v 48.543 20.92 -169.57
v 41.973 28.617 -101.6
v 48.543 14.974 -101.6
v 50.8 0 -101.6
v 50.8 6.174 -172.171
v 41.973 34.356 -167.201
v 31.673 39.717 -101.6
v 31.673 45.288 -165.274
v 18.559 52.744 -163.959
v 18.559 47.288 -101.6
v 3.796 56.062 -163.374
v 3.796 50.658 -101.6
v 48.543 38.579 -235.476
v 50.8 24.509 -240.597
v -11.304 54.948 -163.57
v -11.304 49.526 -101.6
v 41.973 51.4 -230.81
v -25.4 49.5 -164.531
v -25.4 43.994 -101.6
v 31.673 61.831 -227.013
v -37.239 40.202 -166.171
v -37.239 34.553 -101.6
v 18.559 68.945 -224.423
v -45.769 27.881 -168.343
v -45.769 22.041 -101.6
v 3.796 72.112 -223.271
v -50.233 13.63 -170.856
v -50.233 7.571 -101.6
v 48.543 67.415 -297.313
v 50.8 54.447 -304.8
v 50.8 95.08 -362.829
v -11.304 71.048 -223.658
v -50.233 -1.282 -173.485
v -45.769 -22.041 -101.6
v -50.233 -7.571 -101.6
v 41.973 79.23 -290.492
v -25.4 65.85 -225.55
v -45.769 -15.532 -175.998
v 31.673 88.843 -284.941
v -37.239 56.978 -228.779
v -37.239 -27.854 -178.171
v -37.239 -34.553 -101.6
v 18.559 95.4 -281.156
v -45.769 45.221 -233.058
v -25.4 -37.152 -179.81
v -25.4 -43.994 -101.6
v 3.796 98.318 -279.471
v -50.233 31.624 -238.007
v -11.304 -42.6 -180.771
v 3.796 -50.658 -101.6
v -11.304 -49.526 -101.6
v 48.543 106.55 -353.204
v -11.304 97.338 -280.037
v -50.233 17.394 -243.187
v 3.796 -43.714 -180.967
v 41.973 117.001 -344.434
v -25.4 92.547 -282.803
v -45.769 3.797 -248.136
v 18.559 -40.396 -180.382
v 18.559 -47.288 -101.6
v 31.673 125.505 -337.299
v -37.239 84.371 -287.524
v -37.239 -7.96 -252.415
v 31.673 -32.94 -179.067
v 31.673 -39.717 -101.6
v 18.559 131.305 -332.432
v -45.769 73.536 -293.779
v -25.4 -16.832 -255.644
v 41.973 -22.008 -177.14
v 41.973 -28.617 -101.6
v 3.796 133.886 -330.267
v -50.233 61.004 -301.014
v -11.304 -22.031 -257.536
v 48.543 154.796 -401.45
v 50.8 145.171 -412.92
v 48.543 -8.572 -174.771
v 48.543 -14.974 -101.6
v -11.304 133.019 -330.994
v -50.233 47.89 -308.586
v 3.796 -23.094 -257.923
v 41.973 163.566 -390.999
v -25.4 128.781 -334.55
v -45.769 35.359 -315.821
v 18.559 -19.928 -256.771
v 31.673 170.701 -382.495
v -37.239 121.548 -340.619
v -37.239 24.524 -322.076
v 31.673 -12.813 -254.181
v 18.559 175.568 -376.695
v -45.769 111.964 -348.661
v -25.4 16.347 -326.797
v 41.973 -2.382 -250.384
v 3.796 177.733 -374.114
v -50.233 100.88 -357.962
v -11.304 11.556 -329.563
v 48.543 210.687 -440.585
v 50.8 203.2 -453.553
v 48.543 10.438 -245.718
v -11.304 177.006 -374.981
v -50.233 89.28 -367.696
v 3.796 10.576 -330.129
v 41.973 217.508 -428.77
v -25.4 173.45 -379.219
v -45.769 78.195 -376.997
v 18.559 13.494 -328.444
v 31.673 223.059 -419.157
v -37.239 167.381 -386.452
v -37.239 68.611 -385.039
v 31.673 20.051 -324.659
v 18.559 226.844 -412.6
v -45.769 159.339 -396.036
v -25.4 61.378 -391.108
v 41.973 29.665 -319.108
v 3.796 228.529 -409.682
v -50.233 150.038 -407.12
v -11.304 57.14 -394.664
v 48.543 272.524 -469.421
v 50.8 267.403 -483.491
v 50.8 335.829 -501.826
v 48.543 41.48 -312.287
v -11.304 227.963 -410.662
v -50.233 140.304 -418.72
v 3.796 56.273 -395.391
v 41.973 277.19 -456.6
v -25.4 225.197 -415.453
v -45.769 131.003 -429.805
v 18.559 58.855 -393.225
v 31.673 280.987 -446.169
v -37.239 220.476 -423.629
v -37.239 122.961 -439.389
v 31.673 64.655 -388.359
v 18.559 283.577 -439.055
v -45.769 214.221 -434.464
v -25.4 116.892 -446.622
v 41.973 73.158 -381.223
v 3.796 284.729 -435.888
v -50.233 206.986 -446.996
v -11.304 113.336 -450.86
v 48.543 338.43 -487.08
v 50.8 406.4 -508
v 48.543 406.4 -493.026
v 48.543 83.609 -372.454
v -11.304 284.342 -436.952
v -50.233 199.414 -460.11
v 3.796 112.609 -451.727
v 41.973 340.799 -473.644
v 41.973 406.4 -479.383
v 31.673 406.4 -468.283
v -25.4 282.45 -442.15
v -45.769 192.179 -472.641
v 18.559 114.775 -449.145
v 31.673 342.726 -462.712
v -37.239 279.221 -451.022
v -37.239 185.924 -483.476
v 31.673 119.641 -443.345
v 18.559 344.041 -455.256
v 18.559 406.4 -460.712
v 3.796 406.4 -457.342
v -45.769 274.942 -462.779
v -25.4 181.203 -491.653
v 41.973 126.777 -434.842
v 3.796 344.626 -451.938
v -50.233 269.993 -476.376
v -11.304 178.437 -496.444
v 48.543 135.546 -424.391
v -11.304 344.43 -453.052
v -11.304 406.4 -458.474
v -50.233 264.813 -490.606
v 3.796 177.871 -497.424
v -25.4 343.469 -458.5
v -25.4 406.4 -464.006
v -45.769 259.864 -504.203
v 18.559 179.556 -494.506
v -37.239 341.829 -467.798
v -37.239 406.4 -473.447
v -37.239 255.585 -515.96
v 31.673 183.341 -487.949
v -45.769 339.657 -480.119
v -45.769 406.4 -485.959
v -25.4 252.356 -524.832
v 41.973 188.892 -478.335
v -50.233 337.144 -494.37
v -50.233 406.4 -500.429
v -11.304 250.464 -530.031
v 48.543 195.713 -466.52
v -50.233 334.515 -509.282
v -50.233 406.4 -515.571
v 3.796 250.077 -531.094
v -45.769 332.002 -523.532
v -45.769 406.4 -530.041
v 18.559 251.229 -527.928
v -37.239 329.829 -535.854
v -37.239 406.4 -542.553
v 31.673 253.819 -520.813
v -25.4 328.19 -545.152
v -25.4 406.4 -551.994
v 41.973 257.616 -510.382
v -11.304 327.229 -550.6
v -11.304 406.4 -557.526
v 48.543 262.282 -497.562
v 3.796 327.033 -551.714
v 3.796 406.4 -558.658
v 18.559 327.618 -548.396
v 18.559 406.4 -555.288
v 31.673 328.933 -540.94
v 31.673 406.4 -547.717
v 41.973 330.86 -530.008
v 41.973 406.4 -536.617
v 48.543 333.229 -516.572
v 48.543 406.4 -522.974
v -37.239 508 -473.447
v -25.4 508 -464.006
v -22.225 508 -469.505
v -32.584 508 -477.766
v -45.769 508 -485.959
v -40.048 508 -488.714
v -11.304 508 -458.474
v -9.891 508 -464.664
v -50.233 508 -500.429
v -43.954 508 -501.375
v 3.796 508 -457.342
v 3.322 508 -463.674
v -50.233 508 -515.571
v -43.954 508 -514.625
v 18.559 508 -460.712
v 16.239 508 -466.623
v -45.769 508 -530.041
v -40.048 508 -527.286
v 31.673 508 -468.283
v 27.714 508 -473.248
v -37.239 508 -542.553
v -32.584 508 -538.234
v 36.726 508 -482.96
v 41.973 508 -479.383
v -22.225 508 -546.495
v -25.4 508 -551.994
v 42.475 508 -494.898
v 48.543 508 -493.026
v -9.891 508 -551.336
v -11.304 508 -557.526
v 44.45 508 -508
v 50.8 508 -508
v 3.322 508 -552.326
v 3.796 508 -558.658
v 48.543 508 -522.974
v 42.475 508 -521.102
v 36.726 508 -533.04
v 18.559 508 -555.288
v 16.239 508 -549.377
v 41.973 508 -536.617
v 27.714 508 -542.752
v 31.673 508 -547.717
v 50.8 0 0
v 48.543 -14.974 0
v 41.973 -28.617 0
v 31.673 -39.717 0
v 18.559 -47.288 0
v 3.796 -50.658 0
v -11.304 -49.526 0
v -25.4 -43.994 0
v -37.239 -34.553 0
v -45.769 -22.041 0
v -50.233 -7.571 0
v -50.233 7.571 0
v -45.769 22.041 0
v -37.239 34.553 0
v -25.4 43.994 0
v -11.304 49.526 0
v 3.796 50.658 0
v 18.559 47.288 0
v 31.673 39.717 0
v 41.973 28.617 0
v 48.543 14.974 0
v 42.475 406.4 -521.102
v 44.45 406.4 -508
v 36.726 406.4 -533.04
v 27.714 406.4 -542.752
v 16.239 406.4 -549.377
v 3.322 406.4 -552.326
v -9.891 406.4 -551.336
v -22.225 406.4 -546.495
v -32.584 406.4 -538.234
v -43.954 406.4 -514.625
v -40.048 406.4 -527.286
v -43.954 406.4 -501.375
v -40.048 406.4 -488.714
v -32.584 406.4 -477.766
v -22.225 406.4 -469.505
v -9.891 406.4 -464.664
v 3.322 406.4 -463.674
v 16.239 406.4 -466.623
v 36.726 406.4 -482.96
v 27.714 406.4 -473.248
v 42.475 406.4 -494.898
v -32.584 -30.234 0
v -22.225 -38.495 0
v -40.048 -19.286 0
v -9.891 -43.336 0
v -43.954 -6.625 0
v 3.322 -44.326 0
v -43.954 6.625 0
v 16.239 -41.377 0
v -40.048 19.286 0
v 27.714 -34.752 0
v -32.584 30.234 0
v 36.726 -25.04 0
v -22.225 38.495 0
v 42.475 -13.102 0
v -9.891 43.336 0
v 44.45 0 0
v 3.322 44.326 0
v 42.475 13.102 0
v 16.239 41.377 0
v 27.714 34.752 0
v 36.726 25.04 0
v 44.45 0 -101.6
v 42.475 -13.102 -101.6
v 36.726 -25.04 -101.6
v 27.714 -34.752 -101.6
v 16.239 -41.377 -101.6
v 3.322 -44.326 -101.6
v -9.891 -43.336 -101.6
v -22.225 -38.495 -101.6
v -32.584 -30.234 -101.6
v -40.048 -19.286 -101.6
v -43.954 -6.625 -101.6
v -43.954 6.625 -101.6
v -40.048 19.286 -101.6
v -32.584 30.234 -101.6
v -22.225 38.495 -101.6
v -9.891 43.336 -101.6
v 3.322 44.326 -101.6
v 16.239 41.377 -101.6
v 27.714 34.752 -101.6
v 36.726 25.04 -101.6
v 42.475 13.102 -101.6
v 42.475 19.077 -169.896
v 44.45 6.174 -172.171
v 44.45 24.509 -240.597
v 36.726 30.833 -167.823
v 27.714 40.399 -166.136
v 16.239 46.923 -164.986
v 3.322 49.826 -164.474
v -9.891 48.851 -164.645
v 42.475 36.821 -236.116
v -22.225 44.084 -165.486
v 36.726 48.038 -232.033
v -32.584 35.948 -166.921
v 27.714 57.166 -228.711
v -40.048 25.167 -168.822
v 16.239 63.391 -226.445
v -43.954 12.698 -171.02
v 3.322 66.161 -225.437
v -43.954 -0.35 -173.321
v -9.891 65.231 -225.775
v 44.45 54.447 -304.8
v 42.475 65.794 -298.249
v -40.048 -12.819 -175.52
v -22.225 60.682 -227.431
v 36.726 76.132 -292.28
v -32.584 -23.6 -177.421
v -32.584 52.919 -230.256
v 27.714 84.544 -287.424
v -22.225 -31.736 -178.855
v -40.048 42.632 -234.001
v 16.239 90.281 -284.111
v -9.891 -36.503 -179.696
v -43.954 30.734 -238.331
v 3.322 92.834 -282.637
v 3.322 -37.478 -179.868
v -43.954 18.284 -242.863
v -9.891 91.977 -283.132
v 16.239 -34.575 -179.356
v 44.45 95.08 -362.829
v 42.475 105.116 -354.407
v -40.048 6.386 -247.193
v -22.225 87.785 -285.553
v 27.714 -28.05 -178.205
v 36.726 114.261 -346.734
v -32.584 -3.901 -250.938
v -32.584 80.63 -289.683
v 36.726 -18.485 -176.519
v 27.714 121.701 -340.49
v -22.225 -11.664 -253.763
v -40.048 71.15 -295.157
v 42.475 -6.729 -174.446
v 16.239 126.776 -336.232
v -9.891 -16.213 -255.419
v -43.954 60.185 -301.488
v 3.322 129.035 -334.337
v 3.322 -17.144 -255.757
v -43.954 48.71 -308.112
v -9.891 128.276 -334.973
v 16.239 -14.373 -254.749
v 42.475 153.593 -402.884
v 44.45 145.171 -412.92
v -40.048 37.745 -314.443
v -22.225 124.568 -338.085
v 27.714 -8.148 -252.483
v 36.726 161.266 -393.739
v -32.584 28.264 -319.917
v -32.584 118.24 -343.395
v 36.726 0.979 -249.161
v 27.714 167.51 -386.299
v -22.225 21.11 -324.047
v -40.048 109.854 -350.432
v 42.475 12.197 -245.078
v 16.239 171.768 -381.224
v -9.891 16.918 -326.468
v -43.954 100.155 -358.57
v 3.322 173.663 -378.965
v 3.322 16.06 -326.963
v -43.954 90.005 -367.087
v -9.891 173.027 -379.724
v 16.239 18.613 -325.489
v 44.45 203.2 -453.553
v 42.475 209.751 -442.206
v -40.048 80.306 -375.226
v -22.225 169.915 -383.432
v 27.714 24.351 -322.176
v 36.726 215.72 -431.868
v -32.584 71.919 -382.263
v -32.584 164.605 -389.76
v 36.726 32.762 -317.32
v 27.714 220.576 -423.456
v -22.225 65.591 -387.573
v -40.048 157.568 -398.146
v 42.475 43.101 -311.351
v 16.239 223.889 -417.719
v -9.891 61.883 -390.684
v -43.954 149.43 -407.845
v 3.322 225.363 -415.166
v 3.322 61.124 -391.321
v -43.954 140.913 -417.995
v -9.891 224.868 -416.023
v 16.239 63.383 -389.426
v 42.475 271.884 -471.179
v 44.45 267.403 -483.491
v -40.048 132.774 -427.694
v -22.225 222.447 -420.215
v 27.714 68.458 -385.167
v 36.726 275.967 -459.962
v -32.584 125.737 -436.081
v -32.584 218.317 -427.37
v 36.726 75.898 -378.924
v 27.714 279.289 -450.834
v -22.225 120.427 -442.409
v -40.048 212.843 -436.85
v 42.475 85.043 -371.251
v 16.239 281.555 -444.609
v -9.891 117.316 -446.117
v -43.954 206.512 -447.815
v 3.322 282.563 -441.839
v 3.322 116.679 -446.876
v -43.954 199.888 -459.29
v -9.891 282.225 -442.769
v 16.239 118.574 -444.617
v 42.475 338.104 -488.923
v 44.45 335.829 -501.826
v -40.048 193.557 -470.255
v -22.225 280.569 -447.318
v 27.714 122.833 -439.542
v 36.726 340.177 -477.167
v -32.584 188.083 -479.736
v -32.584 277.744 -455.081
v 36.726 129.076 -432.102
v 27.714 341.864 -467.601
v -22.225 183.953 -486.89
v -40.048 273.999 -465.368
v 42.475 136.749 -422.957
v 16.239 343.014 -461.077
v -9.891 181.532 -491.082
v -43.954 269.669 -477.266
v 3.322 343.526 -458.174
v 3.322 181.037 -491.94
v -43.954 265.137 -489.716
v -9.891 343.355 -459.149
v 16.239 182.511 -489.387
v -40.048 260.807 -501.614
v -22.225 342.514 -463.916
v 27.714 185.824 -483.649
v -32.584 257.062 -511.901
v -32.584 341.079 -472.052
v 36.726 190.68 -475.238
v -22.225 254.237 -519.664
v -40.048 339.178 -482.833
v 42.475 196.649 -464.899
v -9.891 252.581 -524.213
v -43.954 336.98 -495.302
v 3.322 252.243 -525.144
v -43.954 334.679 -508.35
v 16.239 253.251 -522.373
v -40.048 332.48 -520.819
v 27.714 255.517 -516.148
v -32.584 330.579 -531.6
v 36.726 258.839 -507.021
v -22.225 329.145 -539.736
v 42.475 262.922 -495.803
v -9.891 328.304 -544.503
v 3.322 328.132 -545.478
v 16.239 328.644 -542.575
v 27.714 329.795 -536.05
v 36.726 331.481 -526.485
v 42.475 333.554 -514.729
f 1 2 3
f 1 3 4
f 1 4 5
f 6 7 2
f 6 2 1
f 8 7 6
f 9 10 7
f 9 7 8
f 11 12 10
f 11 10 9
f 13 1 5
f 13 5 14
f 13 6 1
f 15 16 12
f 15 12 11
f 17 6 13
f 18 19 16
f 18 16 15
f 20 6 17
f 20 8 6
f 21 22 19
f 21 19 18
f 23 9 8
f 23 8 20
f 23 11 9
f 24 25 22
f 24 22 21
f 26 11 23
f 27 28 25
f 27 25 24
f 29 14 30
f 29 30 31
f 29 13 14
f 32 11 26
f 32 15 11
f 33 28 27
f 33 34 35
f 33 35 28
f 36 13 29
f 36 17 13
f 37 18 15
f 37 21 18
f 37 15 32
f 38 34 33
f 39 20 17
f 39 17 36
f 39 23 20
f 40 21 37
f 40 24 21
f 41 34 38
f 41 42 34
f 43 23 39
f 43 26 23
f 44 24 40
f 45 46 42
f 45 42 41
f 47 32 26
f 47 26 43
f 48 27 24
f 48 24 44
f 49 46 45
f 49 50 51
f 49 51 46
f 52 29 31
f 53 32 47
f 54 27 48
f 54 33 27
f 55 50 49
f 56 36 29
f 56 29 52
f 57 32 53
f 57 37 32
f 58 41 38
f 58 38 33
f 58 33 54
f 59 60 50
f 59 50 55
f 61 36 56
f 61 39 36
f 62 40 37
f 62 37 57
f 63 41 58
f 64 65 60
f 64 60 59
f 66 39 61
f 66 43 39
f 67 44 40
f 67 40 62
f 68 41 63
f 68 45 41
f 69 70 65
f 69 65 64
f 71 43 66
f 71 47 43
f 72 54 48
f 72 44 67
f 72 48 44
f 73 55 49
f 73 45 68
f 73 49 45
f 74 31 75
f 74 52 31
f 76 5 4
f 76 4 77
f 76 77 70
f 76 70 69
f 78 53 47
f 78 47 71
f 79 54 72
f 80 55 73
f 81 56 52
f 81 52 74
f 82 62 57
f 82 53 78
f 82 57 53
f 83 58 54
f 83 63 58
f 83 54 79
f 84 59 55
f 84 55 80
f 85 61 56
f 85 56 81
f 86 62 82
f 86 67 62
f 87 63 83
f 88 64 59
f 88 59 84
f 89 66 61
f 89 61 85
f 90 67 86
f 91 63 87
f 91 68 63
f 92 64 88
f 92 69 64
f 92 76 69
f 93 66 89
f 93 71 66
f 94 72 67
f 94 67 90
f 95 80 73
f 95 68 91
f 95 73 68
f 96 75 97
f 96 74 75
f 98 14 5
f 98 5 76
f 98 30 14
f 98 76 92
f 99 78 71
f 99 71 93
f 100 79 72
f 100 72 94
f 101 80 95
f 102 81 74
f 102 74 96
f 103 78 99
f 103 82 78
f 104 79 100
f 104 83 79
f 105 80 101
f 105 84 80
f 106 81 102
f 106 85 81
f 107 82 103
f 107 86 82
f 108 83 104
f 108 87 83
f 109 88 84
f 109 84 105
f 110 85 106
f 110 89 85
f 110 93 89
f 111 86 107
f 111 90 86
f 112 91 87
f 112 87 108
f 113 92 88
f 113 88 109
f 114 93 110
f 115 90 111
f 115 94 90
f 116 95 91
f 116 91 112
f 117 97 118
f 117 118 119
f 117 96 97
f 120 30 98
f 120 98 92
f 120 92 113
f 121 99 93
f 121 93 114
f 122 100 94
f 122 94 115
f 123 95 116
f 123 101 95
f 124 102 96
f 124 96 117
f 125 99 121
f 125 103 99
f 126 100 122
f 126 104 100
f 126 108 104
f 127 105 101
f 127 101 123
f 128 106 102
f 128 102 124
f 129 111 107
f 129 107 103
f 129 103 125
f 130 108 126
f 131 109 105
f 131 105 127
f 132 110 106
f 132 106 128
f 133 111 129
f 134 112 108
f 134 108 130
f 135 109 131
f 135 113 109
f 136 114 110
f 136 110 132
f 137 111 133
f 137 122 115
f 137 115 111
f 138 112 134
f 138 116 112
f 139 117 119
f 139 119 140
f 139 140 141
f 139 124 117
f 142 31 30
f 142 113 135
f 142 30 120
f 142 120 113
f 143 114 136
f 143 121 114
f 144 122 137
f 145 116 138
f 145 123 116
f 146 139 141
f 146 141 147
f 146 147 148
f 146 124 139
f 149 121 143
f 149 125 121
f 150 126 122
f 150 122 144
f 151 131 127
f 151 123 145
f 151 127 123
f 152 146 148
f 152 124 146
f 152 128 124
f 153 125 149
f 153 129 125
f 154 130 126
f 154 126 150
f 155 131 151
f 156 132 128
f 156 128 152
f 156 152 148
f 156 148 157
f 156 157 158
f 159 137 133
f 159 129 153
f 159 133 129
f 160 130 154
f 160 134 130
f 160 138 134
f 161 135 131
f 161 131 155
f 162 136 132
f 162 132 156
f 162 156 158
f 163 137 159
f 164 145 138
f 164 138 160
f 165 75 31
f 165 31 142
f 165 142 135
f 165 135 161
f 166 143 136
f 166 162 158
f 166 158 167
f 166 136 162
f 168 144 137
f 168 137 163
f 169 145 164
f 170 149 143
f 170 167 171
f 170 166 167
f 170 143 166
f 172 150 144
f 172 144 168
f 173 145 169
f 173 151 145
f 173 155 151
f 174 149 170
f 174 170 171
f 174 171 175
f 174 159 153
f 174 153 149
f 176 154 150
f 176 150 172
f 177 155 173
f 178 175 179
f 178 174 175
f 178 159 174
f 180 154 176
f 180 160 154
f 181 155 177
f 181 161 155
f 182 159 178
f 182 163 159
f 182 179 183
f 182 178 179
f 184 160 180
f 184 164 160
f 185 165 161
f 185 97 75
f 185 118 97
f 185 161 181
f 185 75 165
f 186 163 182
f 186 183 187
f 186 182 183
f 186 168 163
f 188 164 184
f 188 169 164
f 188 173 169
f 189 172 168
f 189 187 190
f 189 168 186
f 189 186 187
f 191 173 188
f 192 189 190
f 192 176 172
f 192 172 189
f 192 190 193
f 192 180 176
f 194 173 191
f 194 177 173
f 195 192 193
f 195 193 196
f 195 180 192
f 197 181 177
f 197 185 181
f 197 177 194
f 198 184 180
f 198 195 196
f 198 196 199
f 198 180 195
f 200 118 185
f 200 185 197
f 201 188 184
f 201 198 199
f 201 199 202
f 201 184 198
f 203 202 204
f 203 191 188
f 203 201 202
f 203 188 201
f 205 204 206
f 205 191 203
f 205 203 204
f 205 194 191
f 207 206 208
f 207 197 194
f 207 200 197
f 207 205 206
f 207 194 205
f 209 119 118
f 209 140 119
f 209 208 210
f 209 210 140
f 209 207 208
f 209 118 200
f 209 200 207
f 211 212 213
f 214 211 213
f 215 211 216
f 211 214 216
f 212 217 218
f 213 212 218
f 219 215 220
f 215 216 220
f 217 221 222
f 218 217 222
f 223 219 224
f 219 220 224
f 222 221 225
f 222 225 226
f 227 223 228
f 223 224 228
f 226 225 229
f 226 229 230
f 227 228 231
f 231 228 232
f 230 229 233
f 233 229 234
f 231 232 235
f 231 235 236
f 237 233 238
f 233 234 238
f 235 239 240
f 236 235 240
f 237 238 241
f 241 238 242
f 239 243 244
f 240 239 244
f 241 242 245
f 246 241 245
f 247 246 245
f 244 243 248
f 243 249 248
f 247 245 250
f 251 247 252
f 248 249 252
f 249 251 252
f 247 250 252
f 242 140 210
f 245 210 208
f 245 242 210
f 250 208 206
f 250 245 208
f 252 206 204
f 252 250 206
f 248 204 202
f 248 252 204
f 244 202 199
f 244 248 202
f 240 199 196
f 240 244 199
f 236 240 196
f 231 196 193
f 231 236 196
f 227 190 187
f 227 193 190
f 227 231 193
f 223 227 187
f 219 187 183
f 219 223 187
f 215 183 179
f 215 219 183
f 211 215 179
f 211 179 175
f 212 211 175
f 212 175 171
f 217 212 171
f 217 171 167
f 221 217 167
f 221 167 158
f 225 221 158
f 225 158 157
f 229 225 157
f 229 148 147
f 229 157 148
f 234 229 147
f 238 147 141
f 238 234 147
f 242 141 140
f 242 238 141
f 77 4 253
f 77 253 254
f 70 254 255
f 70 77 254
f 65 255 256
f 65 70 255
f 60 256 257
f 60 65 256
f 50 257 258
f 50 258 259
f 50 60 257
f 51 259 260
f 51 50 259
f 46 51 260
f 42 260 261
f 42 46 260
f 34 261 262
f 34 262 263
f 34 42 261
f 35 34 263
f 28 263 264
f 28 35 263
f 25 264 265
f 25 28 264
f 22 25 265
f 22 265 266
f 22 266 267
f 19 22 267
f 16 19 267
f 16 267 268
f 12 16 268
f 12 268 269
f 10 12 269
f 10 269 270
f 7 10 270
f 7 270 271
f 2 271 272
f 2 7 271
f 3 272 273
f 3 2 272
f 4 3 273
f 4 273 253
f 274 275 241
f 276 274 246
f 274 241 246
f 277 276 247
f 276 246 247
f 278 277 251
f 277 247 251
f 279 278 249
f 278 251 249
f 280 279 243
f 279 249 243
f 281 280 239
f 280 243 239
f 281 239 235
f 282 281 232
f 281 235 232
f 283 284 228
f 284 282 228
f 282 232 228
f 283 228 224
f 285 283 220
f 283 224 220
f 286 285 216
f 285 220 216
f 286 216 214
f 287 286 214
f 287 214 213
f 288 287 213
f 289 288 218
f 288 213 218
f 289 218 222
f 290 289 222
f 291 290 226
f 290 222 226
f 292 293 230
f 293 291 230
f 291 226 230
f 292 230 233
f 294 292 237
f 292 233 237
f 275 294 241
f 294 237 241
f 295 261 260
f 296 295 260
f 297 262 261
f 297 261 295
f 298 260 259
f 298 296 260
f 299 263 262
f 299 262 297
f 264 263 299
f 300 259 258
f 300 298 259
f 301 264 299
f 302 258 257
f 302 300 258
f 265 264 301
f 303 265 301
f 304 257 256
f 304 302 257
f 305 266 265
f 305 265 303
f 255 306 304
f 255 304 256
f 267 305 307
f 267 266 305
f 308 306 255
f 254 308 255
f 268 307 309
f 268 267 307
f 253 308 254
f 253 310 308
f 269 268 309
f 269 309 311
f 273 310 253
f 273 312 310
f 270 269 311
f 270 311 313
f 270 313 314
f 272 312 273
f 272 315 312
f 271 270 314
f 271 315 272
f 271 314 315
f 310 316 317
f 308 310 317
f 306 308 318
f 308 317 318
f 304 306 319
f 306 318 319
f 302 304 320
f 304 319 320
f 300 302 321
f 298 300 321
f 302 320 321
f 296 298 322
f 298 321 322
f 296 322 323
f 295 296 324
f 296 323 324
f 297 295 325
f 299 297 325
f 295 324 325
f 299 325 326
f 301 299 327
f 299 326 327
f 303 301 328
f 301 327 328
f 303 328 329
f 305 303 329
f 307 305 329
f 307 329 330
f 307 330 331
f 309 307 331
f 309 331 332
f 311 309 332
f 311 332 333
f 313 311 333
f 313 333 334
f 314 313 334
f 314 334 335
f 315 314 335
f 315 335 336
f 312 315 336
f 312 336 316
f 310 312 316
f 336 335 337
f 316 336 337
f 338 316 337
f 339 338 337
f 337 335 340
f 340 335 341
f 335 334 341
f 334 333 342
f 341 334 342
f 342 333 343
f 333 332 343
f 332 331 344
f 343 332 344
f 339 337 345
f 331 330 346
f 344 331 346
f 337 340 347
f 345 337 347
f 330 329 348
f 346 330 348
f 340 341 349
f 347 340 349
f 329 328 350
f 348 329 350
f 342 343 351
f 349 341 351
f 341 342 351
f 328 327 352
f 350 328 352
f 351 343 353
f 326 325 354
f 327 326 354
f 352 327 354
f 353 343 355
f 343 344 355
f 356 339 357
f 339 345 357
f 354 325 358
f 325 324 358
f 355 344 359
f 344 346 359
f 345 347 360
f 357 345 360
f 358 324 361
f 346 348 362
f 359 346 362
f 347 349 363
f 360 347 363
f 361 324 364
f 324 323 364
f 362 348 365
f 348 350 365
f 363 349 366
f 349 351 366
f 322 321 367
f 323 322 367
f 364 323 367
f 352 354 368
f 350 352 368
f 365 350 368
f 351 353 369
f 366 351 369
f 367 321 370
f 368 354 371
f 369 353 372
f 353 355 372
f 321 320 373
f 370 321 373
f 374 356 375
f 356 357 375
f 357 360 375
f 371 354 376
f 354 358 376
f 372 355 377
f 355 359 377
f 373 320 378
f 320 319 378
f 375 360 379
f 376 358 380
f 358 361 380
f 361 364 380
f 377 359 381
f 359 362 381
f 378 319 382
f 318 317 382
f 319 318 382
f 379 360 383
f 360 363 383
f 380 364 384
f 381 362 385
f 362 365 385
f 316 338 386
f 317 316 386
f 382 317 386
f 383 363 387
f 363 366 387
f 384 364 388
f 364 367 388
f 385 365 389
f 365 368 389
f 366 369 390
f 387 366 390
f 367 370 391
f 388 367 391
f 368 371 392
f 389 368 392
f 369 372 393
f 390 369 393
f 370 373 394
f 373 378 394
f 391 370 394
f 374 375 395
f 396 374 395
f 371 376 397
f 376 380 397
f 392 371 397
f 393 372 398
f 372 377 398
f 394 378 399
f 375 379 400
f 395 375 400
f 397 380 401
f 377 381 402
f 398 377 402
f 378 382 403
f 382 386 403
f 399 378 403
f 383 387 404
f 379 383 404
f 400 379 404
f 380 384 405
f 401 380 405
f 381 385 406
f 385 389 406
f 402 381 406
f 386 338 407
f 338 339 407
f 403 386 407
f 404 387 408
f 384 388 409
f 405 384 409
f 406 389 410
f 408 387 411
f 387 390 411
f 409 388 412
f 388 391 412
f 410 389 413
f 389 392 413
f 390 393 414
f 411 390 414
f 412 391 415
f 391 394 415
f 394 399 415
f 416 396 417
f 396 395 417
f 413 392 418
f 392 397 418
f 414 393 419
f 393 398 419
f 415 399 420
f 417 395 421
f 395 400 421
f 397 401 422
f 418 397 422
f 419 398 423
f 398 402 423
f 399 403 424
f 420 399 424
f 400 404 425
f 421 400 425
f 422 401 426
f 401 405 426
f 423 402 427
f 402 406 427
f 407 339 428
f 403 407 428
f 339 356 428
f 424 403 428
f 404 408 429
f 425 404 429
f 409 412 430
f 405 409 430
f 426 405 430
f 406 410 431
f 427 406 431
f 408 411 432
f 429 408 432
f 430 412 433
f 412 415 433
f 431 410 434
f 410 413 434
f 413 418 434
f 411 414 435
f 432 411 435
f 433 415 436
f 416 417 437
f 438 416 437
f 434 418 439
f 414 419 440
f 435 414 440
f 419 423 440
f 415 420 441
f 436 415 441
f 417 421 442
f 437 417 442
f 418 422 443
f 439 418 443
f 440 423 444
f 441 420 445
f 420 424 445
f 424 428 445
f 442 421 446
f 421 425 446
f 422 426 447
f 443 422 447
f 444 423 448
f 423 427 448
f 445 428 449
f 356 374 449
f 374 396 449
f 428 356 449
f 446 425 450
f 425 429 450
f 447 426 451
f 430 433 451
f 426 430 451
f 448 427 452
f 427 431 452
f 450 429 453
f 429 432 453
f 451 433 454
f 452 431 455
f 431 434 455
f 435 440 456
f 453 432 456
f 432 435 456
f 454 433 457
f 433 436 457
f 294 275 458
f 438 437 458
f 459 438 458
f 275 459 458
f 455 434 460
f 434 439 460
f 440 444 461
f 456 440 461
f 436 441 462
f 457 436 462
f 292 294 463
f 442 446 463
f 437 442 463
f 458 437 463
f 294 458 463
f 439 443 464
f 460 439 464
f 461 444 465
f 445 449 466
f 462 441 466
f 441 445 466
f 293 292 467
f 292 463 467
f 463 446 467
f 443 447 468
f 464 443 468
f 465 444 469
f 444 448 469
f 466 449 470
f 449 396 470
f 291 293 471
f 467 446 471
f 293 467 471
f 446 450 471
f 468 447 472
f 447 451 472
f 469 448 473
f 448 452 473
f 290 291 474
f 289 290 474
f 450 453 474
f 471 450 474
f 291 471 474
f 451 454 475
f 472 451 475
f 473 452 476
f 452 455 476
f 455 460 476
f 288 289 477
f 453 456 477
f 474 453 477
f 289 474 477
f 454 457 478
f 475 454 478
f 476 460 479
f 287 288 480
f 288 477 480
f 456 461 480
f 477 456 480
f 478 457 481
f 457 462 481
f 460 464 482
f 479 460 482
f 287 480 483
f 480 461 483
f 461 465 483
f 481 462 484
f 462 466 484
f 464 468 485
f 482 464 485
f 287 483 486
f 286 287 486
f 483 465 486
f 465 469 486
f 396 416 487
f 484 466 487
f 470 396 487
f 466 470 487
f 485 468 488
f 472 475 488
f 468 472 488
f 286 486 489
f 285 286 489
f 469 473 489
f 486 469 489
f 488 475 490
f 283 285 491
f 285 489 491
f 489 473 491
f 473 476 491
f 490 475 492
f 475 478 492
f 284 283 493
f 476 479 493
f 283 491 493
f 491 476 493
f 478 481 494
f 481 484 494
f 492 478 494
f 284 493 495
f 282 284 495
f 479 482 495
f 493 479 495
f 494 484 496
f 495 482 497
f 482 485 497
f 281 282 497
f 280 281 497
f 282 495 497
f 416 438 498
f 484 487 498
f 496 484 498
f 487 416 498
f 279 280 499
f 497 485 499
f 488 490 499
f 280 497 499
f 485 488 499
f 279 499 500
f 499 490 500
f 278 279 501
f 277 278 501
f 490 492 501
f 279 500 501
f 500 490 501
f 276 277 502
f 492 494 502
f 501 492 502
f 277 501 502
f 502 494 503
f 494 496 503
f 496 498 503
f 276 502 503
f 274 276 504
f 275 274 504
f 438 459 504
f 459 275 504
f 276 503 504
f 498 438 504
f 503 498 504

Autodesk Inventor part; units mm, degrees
ref_plane "YZ Plane" through (0, 0, 0) normal (1, 0, 0) x (0, 1, 0)
ref_plane "XZ Plane" through (0, 0, 0) normal (0, 1, 0) x (-1, 0, 0)
ref_plane "XY Plane" through (0, 0, 0) normal (0, 0, 1) x (1, 0, 0)
sketch "Sketch1" plane through (0, 0, 0) normal (1, 0, 0) x (0, 1, 0)
  line L0 (0, 0) -> (0, -101.6)
  arc A0 (0, -101.6) -> (406.4, -508) centre (406.4, -101.6) ccw
  line L1 (406.4, -508) -> (508, -508)
  dimension "bendAngle" = 90
  dimension "centerlineRadius" = 406.4
  dimension "tangentLength" = 101.6
sketch "Sketch2" plane through (0, 0, 0) normal (0, 0, 1) x (1, 0, 0)
  circle A0 centre (0, 0) radius 50.8
  circle A1 centre (0, 0) radius 44.45
  dimension "outerDiameter" = 101.6
  dimension "wallThickness" = 6.35
sweep "Sweep1" add profiles "Sketch2" path "Sketch1"
properties part number "Tube Bend"
